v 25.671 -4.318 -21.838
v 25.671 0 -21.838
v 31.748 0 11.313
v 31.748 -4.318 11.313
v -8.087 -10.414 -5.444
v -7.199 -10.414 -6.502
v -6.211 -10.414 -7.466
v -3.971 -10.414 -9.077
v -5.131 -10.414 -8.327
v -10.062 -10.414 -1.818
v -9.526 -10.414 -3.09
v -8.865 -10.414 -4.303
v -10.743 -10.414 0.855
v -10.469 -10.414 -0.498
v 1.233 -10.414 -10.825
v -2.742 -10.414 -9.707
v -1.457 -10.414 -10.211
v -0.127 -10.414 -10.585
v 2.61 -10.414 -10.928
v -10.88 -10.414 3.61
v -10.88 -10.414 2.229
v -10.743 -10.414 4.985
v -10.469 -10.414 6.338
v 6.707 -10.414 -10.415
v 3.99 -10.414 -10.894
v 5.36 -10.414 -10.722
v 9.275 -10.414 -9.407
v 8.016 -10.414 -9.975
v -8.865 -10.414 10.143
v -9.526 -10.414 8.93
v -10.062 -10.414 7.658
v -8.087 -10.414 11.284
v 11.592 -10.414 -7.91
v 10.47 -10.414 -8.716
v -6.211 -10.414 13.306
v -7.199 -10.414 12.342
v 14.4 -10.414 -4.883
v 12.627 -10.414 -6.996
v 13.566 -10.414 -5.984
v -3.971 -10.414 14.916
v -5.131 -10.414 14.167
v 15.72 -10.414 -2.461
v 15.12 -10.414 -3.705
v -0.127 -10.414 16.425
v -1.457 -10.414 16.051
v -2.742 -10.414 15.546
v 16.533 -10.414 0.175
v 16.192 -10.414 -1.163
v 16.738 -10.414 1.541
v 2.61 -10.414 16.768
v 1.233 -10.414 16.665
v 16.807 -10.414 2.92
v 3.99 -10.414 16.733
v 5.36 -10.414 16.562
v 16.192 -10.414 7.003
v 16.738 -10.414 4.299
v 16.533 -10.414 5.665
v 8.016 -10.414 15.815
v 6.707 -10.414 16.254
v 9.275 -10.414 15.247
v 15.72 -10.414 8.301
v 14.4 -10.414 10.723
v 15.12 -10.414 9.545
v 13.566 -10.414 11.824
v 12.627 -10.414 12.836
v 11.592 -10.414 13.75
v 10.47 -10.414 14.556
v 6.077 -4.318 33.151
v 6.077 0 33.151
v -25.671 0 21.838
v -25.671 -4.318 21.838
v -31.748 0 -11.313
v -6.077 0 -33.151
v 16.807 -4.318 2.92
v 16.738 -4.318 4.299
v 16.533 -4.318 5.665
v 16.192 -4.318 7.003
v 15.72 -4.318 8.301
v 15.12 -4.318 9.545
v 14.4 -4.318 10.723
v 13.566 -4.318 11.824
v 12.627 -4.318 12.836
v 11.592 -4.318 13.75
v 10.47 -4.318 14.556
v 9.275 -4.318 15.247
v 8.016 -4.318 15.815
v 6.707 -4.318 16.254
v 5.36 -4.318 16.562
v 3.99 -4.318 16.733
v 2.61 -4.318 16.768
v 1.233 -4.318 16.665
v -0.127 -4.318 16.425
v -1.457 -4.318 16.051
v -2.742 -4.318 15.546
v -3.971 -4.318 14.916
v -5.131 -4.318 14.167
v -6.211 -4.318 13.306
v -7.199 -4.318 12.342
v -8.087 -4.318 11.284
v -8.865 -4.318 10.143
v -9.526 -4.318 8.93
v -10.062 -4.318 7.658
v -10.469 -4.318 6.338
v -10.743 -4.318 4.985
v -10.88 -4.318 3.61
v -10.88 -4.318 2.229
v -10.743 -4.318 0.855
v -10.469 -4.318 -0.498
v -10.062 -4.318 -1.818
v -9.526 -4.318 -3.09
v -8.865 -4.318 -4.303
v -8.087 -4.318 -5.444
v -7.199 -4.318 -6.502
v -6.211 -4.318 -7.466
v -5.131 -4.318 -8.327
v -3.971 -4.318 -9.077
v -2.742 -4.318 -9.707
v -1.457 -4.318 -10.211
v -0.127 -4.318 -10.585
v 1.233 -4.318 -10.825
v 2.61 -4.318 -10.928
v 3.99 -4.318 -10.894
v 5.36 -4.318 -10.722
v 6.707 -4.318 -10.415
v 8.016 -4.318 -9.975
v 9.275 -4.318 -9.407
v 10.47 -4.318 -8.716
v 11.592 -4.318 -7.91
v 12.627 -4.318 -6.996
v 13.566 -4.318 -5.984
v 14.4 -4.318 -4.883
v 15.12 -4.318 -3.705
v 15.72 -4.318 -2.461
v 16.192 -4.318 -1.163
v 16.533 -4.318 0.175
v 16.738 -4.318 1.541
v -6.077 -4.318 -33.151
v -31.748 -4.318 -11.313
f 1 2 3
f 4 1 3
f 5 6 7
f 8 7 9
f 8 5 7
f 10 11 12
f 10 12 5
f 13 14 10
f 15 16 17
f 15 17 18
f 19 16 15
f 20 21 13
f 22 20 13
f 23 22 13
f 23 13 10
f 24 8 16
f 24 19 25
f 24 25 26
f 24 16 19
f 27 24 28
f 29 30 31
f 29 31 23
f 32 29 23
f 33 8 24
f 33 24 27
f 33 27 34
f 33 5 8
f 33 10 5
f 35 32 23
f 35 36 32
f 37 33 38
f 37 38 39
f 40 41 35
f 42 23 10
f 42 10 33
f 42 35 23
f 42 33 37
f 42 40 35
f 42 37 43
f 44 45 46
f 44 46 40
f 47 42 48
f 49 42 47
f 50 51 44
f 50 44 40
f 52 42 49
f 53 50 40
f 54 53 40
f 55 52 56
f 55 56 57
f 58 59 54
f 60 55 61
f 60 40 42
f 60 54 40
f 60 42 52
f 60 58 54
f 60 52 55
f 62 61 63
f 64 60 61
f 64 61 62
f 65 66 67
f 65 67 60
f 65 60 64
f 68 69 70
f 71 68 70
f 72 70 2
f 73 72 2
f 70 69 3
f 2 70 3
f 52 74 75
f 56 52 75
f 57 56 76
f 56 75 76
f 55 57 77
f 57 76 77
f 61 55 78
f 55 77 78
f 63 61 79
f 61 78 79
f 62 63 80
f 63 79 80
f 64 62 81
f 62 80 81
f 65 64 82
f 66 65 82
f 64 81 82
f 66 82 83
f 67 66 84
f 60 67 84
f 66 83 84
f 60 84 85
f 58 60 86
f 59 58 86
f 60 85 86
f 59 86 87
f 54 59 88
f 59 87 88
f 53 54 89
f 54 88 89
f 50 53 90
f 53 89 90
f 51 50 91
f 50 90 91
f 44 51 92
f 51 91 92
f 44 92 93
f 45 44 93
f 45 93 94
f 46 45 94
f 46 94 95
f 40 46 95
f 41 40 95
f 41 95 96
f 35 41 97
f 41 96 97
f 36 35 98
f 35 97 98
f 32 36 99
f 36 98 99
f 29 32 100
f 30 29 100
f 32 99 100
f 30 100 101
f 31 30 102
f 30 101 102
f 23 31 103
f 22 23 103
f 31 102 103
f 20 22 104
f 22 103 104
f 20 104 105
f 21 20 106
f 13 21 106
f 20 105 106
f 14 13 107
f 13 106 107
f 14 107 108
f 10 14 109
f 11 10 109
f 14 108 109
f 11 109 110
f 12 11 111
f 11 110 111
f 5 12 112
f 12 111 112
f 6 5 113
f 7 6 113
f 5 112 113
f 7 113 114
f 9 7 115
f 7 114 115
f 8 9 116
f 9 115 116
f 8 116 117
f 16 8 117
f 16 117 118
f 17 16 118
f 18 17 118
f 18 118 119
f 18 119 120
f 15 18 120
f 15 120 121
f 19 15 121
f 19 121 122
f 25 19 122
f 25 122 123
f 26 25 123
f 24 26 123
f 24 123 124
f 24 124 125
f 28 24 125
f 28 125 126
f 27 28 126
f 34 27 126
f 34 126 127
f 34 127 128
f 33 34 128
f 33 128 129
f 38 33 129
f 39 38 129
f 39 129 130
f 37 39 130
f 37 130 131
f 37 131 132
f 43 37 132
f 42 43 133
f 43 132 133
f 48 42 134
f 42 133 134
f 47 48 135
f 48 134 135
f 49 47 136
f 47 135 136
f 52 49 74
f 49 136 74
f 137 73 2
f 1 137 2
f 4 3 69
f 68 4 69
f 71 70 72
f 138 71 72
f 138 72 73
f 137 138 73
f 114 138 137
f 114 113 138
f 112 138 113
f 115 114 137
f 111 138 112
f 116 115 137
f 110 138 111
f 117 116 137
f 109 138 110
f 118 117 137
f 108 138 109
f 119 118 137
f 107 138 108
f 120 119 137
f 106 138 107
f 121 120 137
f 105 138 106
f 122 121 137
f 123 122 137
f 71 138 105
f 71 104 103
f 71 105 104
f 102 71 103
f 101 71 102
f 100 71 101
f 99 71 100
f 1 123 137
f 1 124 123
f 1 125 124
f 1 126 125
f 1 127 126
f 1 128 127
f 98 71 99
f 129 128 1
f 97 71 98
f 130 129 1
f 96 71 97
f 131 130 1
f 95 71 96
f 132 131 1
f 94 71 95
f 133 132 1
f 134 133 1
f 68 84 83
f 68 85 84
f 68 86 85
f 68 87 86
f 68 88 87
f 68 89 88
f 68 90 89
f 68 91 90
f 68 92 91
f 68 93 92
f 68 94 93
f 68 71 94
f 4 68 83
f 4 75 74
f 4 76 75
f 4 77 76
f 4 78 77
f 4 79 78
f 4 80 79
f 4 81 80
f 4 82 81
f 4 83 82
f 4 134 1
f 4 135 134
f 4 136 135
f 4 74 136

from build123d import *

# Parameters (mm, degrees)
F1_DEPTH = 4.318
F2_R     = 13.8522977146
F3_DEPTH = 6.096


with BuildPart() as f1:
    # F0 (on Front) → F1 (new body)
    with BuildSketch(Plane.XZ):
        with BuildLine():
            Line((6.0770163177, 33.1509892084), (-25.6710906561, 21.8383451146))
            Line((-25.6710906561, 21.8383451146), (-12.8355453281, 10.9191725573))
            ThreePointArc((-12.8355453281, 10.9191725573), (-5.6563220469, 15.8740534869), (3.0385081589, 16.5754946042))
            Line((3.0385081589, 16.5754946042), (6.0770163177, 33.1509892084))
        make_face()
        Polygon((-15.8740534869, -5.6563220469), (-25.6710906561, 21.8383451146), (-31.7481069739, -11.3126440938), align=None)
        with BuildLine():
            Line((31.7481069739, 11.3126440938), (6.0770163177, 33.1509892084))
            Line((6.0770163177, 33.1509892084), (3.0385081589, 16.5754946042))
            ThreePointArc((3.0385081589, 16.5754946042), (10.9191725573, 12.8355453281), (15.8740534869, 5.6563220469))
            Line((15.8740534869, 5.6563220469), (31.7481069739, 11.3126440938))
        make_face()
        with BuildLine():
            Line((25.6710906561, -21.8383451146), (31.7481069739, 11.3126440938))
            Line((31.7481069739, 11.3126440938), (15.8740534869, 5.6563220469))
            ThreePointArc((15.8740534869, 5.6563220469), (16.6054844473, 2.8700939835), (16.8516928884, 0))
            ThreePointArc((16.8516928884, 0), (10.7883165247, -12.9457243818), (-3.0385081589, -16.5754946042))
            Line((-3.0385081589, -16.5754946042), (-6.0770163177, -33.1509892084))
            Line((-6.0770163177, -33.1509892084), (25.6710906561, -21.8383451146))
        make_face()
        with BuildLine():
            Line((-15.8740534869, -5.6563220469), (-31.7481069739, -11.3126440938))
            Line((-31.7481069739, -11.3126440938), (-6.0770163177, -33.1509892084))
            Line((-6.0770163177, -33.1509892084), (-3.0385081589, -16.5754946042))
            ThreePointArc((-3.0385081589, -16.5754946042), (-10.9191725573, -12.8355453281), (-15.8740534869, -5.6563220469))
        make_face()
        with BuildLine():
            ThreePointArc((15.8740534869, 5.6563220469), (10.9191725573, 12.8355453281), (3.0385081589, 16.5754946042))
            Line((3.0385081589, 16.5754946042), (0, 0))
            Line((0, 0), (15.8740534869, 5.6563220469))
        make_face()
        with BuildLine():
            ThreePointArc((3.0385081589, 16.5754946042), (-5.6563220469, 15.8740534869), (-12.8355453281, 10.9191725573))
            Line((-12.8355453281, 10.9191725573), (0, 0))
            Line((0, 0), (3.0385081589, 16.5754946042))
        make_face()
        with BuildLine():
            Line((0, 0), (-12.8355453281, 10.9191725573))
            ThreePointArc((-12.8355453281, 10.9191725573), (-16.5754946042, 3.0385081589), (-15.8740534869, -5.6563220469))
            Line((-15.8740534869, -5.6563220469), (0, 0))
        make_face()
        with BuildLine():
            Line((-12.8355453281, 10.9191725573), (-25.6710906561, 21.8383451146))
            Line((-25.6710906561, 21.8383451146), (-15.8740534869, -5.6563220469))
            ThreePointArc((-15.8740534869, -5.6563220469), (-16.5754946042, 3.0385081589), (-12.8355453281, 10.9191725573))
        make_face()
        with BuildLine():
            Line((0, 0), (-15.8740534869, -5.6563220469))
            ThreePointArc((-15.8740534869, -5.6563220469), (-10.9191725573, -12.8355453281), (-3.0385081589, -16.5754946042))
            Line((-3.0385081589, -16.5754946042), (0, 0))
        make_face()
        with BuildLine():
            Line((15.8740534869, 5.6563220469), (0, 0))
            Line((0, 0), (-3.0385081589, -16.5754946042))
            ThreePointArc((-3.0385081589, -16.5754946042), (10.7883165247, -12.9457243818), (16.8516928884, 0))
            ThreePointArc((16.8516928884, 0), (16.6054844473, 2.8700939835), (15.8740534869, 5.6563220469))
        make_face()
    extrude(amount=F1_DEPTH)

    # F2 (on face) → F3 (join)
    with BuildSketch(Plane.XZ.offset(4.318)):
        with Locations((2.9549675528, 2.9199353885)):
            Circle(F2_R)
    extrude(amount=F3_DEPTH)


solid = f1.part
